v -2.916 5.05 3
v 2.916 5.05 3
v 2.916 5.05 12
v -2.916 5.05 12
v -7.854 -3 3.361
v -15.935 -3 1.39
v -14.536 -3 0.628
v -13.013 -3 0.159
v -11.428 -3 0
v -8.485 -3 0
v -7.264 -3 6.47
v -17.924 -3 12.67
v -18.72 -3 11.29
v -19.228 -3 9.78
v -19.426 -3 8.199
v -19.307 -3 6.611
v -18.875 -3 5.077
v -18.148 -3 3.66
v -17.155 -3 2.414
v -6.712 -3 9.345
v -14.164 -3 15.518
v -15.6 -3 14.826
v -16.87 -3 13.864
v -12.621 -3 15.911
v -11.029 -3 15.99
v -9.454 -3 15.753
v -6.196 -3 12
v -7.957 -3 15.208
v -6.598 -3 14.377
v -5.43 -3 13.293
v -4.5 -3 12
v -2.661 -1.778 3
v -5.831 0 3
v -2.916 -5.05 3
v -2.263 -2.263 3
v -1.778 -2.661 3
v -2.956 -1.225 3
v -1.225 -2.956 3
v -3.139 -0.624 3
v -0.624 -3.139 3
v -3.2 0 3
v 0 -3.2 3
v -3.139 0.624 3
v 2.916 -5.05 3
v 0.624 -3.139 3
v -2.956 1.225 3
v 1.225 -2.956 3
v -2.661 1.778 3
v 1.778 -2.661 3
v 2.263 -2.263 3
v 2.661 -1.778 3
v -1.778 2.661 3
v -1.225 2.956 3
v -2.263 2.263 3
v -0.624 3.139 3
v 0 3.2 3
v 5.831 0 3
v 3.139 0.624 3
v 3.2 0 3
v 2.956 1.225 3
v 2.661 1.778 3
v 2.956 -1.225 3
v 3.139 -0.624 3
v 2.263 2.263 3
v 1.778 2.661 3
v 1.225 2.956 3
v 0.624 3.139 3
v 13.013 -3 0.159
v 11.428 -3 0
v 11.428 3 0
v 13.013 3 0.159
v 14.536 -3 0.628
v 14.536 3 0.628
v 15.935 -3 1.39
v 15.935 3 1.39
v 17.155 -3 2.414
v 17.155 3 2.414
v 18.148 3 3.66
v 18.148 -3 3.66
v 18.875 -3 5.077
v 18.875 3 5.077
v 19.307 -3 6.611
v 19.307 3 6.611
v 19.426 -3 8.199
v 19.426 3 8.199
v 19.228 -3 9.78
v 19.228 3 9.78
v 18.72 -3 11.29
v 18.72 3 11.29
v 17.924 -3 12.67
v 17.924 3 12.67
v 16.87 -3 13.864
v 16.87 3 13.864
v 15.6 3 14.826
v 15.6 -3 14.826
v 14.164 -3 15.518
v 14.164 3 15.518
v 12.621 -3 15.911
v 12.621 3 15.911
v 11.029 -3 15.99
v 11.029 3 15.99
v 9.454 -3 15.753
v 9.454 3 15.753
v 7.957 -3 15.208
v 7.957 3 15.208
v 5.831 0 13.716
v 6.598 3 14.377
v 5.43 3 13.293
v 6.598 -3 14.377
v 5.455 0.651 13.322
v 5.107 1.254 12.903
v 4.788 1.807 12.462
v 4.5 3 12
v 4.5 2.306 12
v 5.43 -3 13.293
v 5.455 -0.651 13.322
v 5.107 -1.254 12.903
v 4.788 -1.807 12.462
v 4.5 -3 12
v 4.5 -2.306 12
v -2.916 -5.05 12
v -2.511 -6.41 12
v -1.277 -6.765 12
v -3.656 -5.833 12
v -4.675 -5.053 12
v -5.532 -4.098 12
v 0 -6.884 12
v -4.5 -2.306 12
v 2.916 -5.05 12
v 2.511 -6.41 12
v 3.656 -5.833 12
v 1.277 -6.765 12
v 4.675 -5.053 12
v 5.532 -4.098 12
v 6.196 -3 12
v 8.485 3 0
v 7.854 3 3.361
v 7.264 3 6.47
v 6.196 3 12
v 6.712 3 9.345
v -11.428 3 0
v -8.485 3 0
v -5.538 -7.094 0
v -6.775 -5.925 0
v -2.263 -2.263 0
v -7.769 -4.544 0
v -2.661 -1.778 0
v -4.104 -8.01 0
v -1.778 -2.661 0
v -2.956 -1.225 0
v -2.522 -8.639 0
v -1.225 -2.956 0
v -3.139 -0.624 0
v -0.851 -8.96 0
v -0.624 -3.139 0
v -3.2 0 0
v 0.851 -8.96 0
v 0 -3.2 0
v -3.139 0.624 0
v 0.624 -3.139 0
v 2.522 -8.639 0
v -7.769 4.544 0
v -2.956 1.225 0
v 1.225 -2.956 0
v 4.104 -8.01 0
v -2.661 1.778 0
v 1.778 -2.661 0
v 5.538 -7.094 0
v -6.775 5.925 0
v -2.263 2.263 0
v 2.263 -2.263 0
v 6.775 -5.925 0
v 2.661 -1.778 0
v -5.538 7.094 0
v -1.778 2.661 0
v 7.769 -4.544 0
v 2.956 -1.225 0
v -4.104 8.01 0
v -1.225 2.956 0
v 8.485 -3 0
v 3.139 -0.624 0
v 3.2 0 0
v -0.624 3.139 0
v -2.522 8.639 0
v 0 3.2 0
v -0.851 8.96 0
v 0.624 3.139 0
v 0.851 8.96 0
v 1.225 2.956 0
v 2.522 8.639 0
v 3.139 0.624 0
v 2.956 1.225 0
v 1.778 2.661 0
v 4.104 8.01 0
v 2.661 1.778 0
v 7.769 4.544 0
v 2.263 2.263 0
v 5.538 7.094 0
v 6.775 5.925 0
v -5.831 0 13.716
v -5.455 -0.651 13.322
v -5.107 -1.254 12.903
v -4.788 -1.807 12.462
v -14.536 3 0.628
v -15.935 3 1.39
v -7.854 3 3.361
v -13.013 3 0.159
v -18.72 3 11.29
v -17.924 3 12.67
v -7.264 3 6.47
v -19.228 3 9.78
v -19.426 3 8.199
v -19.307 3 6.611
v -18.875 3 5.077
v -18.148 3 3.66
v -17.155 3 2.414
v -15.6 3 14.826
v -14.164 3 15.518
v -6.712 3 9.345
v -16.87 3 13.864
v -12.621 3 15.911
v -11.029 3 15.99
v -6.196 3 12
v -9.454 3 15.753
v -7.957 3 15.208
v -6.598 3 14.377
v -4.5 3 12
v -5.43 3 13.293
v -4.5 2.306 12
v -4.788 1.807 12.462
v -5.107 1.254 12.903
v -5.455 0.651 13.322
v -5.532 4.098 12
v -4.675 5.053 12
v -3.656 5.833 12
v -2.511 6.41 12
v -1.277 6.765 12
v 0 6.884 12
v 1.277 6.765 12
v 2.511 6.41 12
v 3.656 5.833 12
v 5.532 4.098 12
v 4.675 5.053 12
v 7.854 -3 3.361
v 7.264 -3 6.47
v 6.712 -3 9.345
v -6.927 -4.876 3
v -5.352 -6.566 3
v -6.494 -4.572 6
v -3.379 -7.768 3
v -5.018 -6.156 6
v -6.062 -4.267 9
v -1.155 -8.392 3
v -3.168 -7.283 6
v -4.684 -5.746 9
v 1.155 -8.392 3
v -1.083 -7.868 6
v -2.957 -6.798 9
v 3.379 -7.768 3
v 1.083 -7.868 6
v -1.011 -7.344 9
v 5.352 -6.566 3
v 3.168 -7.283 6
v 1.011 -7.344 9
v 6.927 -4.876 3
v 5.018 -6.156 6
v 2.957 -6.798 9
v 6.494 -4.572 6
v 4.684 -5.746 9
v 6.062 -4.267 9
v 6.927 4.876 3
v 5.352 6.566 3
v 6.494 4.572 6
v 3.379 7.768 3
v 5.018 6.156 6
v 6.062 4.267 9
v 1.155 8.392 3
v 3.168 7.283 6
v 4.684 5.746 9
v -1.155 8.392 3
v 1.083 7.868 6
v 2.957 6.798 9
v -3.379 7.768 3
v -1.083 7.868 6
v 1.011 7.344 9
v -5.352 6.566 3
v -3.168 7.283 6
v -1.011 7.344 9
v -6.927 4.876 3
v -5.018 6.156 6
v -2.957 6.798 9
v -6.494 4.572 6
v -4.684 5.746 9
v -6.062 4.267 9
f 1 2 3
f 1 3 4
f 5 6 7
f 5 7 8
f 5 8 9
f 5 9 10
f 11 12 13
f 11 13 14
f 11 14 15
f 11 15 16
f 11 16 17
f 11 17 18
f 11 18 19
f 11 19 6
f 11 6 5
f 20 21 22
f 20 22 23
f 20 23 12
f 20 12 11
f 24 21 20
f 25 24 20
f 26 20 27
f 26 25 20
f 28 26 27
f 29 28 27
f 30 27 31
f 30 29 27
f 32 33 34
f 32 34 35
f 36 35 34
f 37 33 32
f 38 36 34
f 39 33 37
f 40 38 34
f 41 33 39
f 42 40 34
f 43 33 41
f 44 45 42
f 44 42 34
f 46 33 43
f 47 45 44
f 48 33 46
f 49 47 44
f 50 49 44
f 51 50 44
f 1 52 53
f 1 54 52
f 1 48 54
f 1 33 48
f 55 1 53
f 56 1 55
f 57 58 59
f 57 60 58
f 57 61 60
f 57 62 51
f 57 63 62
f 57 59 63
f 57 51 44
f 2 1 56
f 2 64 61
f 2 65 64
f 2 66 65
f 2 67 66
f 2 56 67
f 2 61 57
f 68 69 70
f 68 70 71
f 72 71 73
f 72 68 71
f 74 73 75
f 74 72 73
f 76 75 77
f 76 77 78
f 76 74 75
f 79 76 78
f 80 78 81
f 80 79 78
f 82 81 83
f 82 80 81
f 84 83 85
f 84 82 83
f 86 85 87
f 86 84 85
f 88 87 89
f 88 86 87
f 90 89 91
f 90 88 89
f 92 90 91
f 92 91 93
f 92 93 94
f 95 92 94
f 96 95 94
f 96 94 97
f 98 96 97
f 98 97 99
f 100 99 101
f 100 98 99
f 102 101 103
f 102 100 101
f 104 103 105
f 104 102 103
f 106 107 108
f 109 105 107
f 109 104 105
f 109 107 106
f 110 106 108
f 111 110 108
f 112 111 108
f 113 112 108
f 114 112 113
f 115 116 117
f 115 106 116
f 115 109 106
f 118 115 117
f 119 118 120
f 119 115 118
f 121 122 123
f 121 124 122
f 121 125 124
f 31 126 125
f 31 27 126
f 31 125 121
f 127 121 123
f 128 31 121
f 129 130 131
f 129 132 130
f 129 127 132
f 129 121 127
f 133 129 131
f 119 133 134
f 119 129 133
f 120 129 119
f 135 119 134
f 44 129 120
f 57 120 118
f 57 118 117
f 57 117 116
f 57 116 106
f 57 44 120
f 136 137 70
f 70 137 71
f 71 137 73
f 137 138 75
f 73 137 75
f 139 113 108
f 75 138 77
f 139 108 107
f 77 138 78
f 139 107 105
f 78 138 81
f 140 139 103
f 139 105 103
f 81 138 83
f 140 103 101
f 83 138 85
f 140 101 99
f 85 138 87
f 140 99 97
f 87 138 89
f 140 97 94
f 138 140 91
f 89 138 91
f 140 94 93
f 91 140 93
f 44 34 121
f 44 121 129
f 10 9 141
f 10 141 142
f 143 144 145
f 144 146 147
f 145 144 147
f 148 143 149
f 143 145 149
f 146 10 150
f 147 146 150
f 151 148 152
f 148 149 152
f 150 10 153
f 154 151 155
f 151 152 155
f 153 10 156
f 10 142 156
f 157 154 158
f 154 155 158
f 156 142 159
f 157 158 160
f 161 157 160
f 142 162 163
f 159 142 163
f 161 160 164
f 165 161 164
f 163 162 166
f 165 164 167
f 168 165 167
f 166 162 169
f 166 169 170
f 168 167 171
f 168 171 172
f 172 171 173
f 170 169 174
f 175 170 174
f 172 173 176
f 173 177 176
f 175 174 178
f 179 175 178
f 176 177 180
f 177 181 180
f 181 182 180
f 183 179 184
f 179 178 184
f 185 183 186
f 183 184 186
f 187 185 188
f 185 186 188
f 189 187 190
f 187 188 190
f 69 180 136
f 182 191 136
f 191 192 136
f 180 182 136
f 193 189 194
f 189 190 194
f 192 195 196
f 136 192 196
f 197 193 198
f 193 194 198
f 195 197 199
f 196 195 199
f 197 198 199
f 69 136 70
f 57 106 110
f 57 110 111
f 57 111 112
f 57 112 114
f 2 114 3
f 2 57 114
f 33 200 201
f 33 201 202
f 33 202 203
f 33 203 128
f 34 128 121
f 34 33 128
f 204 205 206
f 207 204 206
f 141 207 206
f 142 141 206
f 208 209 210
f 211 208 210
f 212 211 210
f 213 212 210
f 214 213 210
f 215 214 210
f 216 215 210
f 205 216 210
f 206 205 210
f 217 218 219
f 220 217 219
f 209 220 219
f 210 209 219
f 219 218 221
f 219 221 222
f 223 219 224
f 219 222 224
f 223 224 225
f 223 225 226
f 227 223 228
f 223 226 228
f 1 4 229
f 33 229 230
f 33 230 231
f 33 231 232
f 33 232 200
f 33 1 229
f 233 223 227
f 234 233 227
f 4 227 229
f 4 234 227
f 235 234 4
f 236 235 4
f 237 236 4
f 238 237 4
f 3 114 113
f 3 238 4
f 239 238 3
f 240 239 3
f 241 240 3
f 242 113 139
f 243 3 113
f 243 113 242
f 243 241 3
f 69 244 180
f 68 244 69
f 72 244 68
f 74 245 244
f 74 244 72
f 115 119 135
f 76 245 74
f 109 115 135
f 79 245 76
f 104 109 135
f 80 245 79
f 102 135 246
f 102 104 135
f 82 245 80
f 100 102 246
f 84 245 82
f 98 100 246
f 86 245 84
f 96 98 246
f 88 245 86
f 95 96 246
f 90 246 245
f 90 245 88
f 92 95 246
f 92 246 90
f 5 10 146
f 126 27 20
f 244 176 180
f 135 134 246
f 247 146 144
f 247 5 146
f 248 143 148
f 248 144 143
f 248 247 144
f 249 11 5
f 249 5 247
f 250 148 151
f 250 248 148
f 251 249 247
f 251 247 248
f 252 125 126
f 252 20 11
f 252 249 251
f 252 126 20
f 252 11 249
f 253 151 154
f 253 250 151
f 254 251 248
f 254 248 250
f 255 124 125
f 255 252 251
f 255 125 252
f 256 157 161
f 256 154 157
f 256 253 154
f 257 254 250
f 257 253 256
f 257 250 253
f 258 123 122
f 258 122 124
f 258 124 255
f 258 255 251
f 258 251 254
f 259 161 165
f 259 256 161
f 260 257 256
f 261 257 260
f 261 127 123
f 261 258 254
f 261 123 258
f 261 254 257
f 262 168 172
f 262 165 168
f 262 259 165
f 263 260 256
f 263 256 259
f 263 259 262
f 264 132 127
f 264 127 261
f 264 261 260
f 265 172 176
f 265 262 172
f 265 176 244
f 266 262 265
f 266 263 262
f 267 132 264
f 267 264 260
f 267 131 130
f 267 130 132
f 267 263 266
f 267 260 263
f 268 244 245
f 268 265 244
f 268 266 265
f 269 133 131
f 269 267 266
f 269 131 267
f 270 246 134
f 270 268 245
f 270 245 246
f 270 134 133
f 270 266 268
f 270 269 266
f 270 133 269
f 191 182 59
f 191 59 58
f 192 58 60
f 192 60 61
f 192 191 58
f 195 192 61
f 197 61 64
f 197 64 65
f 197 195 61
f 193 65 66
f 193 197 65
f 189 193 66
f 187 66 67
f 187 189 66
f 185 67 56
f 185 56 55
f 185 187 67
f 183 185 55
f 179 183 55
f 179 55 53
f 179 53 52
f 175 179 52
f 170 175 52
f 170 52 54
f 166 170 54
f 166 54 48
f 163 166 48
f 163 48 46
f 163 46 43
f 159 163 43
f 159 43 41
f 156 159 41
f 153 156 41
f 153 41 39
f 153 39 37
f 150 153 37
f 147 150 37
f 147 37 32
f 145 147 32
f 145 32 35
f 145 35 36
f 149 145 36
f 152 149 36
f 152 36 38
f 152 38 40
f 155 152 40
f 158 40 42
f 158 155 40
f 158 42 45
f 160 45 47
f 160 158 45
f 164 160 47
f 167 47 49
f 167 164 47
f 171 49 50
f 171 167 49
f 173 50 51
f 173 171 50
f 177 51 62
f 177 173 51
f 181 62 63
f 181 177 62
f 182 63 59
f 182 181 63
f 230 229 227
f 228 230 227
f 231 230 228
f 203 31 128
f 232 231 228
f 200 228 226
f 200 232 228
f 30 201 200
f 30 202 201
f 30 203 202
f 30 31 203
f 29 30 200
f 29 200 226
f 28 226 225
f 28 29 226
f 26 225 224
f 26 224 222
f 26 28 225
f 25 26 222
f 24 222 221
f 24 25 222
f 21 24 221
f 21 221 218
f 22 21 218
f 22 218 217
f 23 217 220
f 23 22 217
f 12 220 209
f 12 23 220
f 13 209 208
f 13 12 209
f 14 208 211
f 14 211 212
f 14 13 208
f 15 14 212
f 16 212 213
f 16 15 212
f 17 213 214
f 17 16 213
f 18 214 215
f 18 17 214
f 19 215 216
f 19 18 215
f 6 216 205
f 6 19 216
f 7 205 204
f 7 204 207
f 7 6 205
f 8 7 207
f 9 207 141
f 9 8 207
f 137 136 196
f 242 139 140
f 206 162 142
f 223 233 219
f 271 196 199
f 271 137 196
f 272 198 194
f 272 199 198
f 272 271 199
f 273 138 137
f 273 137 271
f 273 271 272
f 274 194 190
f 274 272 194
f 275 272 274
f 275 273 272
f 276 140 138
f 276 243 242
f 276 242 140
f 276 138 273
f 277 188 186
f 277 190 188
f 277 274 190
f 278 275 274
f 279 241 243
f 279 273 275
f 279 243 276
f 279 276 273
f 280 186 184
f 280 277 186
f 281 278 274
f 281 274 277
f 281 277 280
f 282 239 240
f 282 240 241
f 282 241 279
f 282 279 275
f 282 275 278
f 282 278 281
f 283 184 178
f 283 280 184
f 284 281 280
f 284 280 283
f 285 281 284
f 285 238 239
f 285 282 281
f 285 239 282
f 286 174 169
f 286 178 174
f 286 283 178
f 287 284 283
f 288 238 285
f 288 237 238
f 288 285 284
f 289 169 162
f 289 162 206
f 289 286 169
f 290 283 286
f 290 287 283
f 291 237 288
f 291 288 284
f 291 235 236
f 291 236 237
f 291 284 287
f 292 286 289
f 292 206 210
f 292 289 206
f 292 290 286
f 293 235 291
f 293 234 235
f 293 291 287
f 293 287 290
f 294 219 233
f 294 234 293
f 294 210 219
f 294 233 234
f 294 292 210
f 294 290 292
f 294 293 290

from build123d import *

# Parameters (mm, degrees)
F0_R     = 9
F0_R_2   = 3.2
F1_DEPTH = 12
F1_TAPER = 10
F3_DEPTH = 3
F4_DEPTH = 12
F5_START = 3
F5_DEPTH = 22


with BuildPart() as f1:
    # F0 (on Top) → F1 (new body)
    with BuildSketch(Plane.XY):
        Circle(F0_R)
        Polygon((-5.8312377188, 0), (-2.9156188594, 5.05), (2.9156188594, 5.05), (5.8312377188, 0), (2.9156188594, -5.05), (-2.9156188594, -5.05), align=None, mode=Mode.SUBTRACT)
        Polygon((2.9156188594, 5.05), (-2.9156188594, 5.05), (-5.8312377188, 0), (-2.9156188594, -5.05), (2.9156188594, -5.05), (5.8312377188, 0), align=None)
        Circle(F0_R_2, mode=Mode.SUBTRACT)
        Circle(F0_R_2)
    extrude(amount=F1_DEPTH, taper=F1_TAPER)

    # F2 (on Front) → F3 (join, symmetric)
    with BuildSketch(Plane.XZ):
        with BuildLine():
            Line((4.5, 12), (-4.5, 12))
            ThreePointArc((-4.5, 12), (-18.3564064606, 12), (-11.4282032303, 0))
            Line((-11.4282032303, 0), (0, 0))
            Line((0, 0), (11.4282032303, 0))
            ThreePointArc((11.4282032303, 0), (18.3564064606, 12), (4.5, 12))
        make_face()
    extrude(amount=F3_DEPTH, both=True)

    # F0 (on Top) → F4 (cut, through all)
    with BuildSketch(Plane.XY):
        Circle(F0_R_2)
    extrude(amount=F4_DEPTH, mode=Mode.SUBTRACT)

    # F0 (on Top) → F5 (cut)
    with BuildSketch(Plane.XY.offset(F5_START)):
        Polygon((2.9156188594, 5.05), (-2.9156188594, 5.05), (-5.8312377188, 0), (-2.9156188594, -5.05), (2.9156188594, -5.05), (5.8312377188, 0), align=None)
        Circle(F0_R_2, mode=Mode.SUBTRACT)
    extrude(amount=F5_DEPTH, mode=Mode.SUBTRACT)


solid = f1.part
